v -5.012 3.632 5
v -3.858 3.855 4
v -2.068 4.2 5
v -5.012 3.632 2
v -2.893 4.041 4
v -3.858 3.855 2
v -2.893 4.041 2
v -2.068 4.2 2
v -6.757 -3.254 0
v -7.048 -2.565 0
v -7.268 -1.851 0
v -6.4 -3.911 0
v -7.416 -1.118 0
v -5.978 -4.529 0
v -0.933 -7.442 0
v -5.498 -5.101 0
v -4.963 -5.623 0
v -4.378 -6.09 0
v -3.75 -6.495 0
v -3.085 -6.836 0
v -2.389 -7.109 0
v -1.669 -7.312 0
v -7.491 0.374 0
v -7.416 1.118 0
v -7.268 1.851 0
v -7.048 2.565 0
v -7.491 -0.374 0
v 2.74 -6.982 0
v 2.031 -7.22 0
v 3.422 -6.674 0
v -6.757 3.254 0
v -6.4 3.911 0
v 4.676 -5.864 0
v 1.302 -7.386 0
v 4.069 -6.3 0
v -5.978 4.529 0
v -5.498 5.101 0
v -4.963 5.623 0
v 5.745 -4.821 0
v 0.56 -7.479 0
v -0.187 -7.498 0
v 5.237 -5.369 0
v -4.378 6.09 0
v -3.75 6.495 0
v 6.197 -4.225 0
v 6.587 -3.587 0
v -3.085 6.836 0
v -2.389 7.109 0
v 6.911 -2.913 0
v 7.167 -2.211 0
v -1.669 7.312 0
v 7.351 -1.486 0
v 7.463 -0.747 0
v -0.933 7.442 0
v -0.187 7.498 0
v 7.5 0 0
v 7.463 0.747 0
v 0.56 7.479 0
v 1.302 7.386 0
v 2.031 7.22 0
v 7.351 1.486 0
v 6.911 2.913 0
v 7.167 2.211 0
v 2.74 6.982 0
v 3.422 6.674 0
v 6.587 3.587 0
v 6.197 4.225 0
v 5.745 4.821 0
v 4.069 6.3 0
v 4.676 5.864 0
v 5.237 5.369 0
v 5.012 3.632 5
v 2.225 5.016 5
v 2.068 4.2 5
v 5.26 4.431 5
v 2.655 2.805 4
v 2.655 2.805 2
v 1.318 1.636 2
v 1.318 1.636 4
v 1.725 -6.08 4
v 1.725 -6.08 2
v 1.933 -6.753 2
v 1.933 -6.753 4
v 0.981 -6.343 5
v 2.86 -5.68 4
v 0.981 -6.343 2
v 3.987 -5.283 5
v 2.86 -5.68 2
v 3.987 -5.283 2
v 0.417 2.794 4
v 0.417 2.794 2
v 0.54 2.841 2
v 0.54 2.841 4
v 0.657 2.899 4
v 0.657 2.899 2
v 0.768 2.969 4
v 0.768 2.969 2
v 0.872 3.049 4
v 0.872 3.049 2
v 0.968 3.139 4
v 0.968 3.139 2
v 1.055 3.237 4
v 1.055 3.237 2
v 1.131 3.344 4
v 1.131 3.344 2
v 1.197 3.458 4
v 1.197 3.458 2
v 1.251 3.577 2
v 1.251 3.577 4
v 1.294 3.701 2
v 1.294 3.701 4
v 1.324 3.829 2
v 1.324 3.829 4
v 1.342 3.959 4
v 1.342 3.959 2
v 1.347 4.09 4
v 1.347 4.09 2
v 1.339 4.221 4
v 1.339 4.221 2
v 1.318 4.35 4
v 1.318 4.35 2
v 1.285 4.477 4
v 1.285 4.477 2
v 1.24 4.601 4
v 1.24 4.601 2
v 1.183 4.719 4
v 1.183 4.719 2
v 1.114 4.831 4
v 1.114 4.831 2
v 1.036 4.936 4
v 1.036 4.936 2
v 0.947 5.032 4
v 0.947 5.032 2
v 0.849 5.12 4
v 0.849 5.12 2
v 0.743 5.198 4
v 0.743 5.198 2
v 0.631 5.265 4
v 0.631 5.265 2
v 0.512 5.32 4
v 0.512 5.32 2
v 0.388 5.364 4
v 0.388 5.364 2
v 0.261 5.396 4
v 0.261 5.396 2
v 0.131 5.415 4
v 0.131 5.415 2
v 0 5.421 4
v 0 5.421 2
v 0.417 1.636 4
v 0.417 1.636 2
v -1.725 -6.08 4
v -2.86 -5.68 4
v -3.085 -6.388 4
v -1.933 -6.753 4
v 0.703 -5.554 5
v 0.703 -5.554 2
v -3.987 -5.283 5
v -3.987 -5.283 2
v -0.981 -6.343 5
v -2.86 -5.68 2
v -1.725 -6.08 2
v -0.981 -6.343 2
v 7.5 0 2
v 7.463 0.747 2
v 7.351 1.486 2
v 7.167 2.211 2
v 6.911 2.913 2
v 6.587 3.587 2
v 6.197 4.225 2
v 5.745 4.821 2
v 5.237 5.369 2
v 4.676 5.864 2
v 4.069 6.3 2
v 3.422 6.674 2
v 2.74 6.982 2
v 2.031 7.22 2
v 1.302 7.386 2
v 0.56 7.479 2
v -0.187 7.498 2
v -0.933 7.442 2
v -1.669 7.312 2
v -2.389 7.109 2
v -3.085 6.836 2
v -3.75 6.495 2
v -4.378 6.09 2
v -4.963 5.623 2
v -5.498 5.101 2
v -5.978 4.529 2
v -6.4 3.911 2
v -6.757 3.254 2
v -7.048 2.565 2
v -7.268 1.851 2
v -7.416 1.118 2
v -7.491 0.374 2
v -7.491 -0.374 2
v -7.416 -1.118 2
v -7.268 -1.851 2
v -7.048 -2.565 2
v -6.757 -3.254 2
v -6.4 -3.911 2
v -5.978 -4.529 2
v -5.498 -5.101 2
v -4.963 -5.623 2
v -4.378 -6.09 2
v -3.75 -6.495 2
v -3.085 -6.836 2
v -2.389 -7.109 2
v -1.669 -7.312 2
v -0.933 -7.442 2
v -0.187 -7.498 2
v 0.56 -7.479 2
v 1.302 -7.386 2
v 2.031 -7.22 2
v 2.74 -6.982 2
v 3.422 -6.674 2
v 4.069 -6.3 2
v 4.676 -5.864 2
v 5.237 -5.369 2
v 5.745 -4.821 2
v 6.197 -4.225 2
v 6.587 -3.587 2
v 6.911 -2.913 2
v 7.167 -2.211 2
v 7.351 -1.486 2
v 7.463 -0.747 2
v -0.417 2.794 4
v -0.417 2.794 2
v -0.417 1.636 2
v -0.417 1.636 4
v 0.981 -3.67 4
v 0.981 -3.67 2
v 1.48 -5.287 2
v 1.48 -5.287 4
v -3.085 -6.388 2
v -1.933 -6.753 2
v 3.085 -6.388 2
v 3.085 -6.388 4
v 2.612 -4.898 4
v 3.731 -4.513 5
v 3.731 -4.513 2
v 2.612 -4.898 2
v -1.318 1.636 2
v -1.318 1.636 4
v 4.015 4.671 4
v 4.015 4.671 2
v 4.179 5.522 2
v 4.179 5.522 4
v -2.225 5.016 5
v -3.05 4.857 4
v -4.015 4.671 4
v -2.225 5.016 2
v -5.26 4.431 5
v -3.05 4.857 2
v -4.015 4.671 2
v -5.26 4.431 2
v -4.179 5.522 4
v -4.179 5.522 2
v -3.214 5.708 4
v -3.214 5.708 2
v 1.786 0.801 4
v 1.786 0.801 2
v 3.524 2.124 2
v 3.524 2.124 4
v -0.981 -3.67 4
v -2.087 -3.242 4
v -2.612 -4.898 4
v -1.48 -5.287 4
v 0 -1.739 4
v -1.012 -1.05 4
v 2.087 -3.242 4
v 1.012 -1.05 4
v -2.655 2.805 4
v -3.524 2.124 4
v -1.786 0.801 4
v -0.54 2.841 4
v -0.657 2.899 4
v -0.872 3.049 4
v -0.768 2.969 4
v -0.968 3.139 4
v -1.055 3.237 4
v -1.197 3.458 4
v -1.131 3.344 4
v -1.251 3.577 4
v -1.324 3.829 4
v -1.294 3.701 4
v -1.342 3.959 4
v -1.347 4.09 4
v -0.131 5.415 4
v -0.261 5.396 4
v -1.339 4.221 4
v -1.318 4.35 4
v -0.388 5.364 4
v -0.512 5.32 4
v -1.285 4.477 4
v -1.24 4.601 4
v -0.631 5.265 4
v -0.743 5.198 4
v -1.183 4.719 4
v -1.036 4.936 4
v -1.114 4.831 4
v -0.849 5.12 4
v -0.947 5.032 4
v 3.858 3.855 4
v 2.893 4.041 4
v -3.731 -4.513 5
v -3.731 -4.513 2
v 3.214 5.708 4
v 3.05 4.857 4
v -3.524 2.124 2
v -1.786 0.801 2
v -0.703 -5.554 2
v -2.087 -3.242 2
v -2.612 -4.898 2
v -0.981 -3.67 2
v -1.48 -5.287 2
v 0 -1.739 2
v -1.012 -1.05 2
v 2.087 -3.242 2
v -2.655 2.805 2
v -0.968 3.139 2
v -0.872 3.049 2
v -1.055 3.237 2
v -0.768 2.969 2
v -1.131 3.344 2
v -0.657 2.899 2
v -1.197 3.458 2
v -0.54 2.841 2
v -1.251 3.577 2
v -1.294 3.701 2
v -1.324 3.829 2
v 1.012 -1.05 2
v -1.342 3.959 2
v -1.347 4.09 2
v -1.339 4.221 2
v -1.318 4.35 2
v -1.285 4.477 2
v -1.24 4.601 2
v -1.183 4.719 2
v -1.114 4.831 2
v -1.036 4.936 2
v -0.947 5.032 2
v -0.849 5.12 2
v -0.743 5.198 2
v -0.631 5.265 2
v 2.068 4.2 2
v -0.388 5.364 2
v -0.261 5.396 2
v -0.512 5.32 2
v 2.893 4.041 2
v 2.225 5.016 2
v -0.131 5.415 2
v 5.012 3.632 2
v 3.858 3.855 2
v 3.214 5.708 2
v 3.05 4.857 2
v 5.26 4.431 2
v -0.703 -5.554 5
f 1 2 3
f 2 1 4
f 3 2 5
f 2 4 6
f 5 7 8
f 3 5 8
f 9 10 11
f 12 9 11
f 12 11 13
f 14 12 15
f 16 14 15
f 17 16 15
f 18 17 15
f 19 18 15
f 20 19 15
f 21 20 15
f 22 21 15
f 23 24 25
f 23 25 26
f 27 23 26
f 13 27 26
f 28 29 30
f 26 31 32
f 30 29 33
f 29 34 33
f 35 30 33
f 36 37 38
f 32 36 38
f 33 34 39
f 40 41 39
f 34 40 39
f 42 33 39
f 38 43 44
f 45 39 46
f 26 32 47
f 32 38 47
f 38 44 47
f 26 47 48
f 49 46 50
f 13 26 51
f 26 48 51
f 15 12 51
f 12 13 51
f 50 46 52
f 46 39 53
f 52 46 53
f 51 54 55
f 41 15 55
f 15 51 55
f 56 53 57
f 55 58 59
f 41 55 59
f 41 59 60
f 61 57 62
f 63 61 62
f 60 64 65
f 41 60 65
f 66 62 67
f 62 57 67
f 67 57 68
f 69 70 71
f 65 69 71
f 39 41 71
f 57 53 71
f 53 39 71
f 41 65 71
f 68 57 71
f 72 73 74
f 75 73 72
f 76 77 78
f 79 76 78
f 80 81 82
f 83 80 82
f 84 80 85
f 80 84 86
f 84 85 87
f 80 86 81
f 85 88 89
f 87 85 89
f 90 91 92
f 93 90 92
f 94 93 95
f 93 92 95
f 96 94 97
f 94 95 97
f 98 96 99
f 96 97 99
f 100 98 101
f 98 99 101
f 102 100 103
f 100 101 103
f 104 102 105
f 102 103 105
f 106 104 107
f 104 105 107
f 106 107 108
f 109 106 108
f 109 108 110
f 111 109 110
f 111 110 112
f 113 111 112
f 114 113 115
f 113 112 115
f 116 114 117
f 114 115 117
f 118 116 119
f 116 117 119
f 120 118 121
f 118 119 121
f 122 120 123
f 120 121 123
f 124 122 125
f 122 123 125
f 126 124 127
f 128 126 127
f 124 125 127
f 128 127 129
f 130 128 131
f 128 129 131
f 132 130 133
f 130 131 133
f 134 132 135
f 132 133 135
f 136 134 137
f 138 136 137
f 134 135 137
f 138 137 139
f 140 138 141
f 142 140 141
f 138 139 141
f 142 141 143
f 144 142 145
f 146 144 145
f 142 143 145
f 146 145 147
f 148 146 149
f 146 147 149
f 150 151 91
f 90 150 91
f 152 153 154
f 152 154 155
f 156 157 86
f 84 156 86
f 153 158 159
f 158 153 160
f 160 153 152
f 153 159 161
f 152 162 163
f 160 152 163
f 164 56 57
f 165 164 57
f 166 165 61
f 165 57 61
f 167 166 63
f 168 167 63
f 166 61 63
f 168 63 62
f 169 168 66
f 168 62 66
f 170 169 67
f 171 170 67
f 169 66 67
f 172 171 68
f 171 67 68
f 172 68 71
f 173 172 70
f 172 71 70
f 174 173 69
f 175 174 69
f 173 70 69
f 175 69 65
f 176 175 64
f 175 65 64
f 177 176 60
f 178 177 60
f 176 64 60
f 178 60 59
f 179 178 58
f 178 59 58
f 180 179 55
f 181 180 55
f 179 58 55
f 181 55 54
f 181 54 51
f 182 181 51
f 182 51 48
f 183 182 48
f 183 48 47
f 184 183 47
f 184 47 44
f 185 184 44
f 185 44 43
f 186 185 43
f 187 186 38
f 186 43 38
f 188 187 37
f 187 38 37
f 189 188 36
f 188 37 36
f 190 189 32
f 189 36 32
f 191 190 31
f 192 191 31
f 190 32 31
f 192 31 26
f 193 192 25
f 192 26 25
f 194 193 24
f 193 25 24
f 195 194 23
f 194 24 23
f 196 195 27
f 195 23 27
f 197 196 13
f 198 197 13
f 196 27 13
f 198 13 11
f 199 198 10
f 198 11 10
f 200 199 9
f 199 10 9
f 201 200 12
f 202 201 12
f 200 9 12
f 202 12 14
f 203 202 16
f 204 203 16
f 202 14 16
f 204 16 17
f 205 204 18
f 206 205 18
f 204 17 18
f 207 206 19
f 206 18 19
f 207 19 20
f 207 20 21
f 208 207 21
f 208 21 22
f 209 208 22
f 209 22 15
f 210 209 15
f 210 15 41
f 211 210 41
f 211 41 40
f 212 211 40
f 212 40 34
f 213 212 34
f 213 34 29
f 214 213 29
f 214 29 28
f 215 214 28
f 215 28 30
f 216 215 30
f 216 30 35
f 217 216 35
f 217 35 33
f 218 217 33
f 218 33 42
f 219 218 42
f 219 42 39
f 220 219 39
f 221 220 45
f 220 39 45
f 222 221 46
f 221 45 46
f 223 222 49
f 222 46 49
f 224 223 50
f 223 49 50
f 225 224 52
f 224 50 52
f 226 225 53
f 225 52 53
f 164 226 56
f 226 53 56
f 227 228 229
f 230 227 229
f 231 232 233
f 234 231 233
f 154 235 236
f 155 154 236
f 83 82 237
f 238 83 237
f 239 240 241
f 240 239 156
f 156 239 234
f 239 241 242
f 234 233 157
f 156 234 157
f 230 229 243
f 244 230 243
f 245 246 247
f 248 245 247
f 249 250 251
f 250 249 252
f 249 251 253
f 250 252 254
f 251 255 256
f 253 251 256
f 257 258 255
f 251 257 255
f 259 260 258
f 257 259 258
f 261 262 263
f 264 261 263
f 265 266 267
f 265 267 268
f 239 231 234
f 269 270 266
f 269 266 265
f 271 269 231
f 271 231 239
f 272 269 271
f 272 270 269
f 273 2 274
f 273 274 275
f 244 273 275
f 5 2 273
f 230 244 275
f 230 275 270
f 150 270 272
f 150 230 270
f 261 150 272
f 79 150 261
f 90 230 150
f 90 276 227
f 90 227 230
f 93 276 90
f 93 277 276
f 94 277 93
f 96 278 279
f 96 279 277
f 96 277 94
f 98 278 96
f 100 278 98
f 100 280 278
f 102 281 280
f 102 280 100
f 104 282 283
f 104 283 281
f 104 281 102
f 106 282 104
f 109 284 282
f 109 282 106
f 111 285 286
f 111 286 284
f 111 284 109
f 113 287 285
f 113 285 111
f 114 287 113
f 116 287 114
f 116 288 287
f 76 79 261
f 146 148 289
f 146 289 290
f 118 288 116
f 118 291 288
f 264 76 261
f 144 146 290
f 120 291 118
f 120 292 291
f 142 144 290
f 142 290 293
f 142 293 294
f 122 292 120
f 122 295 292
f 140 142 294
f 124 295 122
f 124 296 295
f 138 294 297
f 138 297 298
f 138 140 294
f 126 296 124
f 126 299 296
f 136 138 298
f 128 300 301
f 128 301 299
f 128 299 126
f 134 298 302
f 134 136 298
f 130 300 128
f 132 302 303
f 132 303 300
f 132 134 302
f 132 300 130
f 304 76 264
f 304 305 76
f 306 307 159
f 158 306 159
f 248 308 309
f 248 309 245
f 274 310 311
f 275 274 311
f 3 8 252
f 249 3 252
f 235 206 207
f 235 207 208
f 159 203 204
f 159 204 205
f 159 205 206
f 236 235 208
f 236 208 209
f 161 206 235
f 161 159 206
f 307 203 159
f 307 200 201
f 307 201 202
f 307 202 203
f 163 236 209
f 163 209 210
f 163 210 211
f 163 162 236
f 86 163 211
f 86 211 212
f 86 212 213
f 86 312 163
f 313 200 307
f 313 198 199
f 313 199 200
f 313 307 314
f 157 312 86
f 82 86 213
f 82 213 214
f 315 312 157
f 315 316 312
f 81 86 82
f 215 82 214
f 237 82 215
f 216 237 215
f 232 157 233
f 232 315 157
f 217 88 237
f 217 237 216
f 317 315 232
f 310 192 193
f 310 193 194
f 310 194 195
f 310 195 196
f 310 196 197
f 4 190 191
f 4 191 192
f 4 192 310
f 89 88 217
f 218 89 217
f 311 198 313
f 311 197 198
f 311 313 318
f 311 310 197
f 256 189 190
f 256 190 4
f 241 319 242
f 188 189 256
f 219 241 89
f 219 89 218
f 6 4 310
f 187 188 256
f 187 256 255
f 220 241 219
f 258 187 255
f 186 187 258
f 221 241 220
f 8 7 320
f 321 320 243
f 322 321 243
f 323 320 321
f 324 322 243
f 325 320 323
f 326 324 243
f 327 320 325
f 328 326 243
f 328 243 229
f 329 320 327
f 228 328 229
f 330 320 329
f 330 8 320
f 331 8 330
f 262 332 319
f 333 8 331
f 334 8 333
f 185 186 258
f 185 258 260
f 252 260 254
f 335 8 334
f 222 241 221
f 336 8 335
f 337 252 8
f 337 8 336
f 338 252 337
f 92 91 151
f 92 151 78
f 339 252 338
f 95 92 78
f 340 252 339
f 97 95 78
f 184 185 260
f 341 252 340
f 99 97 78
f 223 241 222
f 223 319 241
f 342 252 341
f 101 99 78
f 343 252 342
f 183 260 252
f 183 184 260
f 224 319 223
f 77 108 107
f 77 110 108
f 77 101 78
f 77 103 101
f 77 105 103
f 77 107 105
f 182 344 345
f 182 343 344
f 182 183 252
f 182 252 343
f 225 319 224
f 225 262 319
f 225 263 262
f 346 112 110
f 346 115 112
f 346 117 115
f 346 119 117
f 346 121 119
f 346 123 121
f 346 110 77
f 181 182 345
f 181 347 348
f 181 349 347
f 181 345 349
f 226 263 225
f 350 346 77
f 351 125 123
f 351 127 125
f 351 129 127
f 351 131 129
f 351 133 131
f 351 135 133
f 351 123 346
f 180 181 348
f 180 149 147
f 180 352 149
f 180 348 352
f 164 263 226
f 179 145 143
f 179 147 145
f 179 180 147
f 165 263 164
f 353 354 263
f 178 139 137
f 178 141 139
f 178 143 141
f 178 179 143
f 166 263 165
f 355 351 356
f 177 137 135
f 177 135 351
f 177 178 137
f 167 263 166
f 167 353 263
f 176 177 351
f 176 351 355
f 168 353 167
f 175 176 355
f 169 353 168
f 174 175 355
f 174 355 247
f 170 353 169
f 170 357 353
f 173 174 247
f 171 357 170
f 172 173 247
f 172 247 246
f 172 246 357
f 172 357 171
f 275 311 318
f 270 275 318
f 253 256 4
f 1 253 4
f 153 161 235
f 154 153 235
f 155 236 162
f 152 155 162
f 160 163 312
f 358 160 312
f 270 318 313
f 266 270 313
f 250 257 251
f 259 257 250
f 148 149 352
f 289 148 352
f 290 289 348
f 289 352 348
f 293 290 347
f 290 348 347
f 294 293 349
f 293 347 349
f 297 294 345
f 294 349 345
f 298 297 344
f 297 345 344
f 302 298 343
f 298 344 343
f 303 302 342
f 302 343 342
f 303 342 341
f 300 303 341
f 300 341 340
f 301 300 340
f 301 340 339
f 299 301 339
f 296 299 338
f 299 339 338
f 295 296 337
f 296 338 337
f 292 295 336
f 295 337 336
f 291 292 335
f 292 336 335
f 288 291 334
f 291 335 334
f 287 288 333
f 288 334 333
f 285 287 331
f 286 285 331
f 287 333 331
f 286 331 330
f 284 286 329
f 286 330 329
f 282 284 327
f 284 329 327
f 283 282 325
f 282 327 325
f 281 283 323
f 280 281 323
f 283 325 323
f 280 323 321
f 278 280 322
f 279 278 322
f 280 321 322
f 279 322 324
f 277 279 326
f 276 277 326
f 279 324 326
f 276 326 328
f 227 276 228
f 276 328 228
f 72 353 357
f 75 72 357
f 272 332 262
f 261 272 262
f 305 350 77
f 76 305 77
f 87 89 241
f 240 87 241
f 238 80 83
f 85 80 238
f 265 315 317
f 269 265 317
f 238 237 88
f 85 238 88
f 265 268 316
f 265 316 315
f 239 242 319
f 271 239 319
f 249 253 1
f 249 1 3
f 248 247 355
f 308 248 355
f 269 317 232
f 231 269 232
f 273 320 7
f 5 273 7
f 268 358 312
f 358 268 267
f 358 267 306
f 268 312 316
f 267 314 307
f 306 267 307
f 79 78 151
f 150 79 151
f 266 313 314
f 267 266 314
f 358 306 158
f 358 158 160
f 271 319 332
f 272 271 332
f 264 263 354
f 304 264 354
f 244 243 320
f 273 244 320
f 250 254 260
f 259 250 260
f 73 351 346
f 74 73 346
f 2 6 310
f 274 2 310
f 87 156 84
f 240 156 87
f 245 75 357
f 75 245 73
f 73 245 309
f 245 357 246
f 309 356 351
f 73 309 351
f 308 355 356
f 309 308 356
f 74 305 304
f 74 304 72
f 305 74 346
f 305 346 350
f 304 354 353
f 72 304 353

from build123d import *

# Parameters (mm, degrees)
F0_R     = 7.5
F1_DEPTH = 2
F3_DEPTH = 2
F5_DEPTH = 3


with BuildPart() as f1:
    # F0 (on Top) → F1 (new body)
    with BuildSketch(Plane.XY):
        Circle(F0_R)
    extrude(amount=F1_DEPTH)

    # F2 (on face) → F3 (join)
    with BuildSketch(Plane.XY.offset(2)):
        with BuildLine():
            Line((0, -1.738777), (0, 5.421451))
            ThreePointArc((0, 5.421451), (-1.329954, 4.285908), (-0.416891, 2.794415))
            Line((-0.416891, 2.794415), (-0.416891, 1.635802))
            Line((-0.416891, 1.635802), (-1.318156, 1.635802))
            Line((-1.318156, 1.635802), (-2.654623, 2.80521))
            Line((-2.654623, 2.80521), (-3.214125, 5.707625))
            Line((-3.214125, 5.707625), (-4.179397, 5.521548))
            Line((-4.179397, 5.521548), (-3.524426, 2.123883))
            Line((-3.524426, 2.123883), (-1.78592, 0.80051))
            Line((-1.78592, 0.80051), (-1.012103, -1.049922))
            Line((-1.012103, -1.049922), (-2.086625, -3.242302))
            Line((-2.086625, -3.242302), (-3.084522, -6.387633))
            Line((-3.084522, -6.387633), (-1.932593, -6.753098))
            Line((-1.932593, -6.753098), (-0.980974, -3.669764))
            Line((-0.980974, -3.669764), (0, -1.738777))
        make_face()
        with BuildLine():
            ThreePointArc((0.416891, 2.794415), (1.329954, 4.285908), (0, 5.421451))
            Line((0, 5.421451), (0, -1.738777))
            Line((0, -1.738777), (0.980974, -3.669764))
            Line((0.980974, -3.669764), (1.932593, -6.753098))
            Line((1.932593, -6.753098), (3.084522, -6.387633))
            Line((3.084522, -6.387633), (2.086625, -3.242302))
            Line((2.086625, -3.242302), (1.012103, -1.049922))
            Line((1.012103, -1.049922), (1.78592, 0.80051))
            Line((1.78592, 0.80051), (3.524426, 2.123883))
            Line((3.524426, 2.123883), (4.179397, 5.521548))
            Line((4.179397, 5.521548), (3.214125, 5.707625))
            Line((3.214125, 5.707625), (2.654623, 2.80521))
            Line((2.654623, 2.80521), (1.318156, 1.635802))
            Line((1.318156, 1.635802), (0.416891, 1.635802))
            Line((0.416891, 1.635802), (0.416891, 2.794415))
        make_face()
    extrude(amount=F3_DEPTH)

    # F4 (on face) → F5 (join)
    with BuildSketch(Plane.XY.offset(2)):
        Polygon((-2.225088, 5.01617), (-5.260212, 4.431086), (-5.012016, 3.632387), (-2.067746, 4.199957), align=None)
        Polygon((-0.703037, -5.554148), (-3.730533, -4.513447), (-3.987216, -5.282778), (-0.980974, -6.34256), align=None)
        Polygon((5.012016, 3.632387), (5.260212, 4.431086), (2.225088, 5.01617), (2.067746, 4.199957), align=None)
        Polygon((3.987216, -5.282778), (3.730533, -4.513447), (0.703037, -5.554148), (0.980974, -6.34256), align=None)
    extrude(amount=F5_DEPTH)


solid = f1.part
